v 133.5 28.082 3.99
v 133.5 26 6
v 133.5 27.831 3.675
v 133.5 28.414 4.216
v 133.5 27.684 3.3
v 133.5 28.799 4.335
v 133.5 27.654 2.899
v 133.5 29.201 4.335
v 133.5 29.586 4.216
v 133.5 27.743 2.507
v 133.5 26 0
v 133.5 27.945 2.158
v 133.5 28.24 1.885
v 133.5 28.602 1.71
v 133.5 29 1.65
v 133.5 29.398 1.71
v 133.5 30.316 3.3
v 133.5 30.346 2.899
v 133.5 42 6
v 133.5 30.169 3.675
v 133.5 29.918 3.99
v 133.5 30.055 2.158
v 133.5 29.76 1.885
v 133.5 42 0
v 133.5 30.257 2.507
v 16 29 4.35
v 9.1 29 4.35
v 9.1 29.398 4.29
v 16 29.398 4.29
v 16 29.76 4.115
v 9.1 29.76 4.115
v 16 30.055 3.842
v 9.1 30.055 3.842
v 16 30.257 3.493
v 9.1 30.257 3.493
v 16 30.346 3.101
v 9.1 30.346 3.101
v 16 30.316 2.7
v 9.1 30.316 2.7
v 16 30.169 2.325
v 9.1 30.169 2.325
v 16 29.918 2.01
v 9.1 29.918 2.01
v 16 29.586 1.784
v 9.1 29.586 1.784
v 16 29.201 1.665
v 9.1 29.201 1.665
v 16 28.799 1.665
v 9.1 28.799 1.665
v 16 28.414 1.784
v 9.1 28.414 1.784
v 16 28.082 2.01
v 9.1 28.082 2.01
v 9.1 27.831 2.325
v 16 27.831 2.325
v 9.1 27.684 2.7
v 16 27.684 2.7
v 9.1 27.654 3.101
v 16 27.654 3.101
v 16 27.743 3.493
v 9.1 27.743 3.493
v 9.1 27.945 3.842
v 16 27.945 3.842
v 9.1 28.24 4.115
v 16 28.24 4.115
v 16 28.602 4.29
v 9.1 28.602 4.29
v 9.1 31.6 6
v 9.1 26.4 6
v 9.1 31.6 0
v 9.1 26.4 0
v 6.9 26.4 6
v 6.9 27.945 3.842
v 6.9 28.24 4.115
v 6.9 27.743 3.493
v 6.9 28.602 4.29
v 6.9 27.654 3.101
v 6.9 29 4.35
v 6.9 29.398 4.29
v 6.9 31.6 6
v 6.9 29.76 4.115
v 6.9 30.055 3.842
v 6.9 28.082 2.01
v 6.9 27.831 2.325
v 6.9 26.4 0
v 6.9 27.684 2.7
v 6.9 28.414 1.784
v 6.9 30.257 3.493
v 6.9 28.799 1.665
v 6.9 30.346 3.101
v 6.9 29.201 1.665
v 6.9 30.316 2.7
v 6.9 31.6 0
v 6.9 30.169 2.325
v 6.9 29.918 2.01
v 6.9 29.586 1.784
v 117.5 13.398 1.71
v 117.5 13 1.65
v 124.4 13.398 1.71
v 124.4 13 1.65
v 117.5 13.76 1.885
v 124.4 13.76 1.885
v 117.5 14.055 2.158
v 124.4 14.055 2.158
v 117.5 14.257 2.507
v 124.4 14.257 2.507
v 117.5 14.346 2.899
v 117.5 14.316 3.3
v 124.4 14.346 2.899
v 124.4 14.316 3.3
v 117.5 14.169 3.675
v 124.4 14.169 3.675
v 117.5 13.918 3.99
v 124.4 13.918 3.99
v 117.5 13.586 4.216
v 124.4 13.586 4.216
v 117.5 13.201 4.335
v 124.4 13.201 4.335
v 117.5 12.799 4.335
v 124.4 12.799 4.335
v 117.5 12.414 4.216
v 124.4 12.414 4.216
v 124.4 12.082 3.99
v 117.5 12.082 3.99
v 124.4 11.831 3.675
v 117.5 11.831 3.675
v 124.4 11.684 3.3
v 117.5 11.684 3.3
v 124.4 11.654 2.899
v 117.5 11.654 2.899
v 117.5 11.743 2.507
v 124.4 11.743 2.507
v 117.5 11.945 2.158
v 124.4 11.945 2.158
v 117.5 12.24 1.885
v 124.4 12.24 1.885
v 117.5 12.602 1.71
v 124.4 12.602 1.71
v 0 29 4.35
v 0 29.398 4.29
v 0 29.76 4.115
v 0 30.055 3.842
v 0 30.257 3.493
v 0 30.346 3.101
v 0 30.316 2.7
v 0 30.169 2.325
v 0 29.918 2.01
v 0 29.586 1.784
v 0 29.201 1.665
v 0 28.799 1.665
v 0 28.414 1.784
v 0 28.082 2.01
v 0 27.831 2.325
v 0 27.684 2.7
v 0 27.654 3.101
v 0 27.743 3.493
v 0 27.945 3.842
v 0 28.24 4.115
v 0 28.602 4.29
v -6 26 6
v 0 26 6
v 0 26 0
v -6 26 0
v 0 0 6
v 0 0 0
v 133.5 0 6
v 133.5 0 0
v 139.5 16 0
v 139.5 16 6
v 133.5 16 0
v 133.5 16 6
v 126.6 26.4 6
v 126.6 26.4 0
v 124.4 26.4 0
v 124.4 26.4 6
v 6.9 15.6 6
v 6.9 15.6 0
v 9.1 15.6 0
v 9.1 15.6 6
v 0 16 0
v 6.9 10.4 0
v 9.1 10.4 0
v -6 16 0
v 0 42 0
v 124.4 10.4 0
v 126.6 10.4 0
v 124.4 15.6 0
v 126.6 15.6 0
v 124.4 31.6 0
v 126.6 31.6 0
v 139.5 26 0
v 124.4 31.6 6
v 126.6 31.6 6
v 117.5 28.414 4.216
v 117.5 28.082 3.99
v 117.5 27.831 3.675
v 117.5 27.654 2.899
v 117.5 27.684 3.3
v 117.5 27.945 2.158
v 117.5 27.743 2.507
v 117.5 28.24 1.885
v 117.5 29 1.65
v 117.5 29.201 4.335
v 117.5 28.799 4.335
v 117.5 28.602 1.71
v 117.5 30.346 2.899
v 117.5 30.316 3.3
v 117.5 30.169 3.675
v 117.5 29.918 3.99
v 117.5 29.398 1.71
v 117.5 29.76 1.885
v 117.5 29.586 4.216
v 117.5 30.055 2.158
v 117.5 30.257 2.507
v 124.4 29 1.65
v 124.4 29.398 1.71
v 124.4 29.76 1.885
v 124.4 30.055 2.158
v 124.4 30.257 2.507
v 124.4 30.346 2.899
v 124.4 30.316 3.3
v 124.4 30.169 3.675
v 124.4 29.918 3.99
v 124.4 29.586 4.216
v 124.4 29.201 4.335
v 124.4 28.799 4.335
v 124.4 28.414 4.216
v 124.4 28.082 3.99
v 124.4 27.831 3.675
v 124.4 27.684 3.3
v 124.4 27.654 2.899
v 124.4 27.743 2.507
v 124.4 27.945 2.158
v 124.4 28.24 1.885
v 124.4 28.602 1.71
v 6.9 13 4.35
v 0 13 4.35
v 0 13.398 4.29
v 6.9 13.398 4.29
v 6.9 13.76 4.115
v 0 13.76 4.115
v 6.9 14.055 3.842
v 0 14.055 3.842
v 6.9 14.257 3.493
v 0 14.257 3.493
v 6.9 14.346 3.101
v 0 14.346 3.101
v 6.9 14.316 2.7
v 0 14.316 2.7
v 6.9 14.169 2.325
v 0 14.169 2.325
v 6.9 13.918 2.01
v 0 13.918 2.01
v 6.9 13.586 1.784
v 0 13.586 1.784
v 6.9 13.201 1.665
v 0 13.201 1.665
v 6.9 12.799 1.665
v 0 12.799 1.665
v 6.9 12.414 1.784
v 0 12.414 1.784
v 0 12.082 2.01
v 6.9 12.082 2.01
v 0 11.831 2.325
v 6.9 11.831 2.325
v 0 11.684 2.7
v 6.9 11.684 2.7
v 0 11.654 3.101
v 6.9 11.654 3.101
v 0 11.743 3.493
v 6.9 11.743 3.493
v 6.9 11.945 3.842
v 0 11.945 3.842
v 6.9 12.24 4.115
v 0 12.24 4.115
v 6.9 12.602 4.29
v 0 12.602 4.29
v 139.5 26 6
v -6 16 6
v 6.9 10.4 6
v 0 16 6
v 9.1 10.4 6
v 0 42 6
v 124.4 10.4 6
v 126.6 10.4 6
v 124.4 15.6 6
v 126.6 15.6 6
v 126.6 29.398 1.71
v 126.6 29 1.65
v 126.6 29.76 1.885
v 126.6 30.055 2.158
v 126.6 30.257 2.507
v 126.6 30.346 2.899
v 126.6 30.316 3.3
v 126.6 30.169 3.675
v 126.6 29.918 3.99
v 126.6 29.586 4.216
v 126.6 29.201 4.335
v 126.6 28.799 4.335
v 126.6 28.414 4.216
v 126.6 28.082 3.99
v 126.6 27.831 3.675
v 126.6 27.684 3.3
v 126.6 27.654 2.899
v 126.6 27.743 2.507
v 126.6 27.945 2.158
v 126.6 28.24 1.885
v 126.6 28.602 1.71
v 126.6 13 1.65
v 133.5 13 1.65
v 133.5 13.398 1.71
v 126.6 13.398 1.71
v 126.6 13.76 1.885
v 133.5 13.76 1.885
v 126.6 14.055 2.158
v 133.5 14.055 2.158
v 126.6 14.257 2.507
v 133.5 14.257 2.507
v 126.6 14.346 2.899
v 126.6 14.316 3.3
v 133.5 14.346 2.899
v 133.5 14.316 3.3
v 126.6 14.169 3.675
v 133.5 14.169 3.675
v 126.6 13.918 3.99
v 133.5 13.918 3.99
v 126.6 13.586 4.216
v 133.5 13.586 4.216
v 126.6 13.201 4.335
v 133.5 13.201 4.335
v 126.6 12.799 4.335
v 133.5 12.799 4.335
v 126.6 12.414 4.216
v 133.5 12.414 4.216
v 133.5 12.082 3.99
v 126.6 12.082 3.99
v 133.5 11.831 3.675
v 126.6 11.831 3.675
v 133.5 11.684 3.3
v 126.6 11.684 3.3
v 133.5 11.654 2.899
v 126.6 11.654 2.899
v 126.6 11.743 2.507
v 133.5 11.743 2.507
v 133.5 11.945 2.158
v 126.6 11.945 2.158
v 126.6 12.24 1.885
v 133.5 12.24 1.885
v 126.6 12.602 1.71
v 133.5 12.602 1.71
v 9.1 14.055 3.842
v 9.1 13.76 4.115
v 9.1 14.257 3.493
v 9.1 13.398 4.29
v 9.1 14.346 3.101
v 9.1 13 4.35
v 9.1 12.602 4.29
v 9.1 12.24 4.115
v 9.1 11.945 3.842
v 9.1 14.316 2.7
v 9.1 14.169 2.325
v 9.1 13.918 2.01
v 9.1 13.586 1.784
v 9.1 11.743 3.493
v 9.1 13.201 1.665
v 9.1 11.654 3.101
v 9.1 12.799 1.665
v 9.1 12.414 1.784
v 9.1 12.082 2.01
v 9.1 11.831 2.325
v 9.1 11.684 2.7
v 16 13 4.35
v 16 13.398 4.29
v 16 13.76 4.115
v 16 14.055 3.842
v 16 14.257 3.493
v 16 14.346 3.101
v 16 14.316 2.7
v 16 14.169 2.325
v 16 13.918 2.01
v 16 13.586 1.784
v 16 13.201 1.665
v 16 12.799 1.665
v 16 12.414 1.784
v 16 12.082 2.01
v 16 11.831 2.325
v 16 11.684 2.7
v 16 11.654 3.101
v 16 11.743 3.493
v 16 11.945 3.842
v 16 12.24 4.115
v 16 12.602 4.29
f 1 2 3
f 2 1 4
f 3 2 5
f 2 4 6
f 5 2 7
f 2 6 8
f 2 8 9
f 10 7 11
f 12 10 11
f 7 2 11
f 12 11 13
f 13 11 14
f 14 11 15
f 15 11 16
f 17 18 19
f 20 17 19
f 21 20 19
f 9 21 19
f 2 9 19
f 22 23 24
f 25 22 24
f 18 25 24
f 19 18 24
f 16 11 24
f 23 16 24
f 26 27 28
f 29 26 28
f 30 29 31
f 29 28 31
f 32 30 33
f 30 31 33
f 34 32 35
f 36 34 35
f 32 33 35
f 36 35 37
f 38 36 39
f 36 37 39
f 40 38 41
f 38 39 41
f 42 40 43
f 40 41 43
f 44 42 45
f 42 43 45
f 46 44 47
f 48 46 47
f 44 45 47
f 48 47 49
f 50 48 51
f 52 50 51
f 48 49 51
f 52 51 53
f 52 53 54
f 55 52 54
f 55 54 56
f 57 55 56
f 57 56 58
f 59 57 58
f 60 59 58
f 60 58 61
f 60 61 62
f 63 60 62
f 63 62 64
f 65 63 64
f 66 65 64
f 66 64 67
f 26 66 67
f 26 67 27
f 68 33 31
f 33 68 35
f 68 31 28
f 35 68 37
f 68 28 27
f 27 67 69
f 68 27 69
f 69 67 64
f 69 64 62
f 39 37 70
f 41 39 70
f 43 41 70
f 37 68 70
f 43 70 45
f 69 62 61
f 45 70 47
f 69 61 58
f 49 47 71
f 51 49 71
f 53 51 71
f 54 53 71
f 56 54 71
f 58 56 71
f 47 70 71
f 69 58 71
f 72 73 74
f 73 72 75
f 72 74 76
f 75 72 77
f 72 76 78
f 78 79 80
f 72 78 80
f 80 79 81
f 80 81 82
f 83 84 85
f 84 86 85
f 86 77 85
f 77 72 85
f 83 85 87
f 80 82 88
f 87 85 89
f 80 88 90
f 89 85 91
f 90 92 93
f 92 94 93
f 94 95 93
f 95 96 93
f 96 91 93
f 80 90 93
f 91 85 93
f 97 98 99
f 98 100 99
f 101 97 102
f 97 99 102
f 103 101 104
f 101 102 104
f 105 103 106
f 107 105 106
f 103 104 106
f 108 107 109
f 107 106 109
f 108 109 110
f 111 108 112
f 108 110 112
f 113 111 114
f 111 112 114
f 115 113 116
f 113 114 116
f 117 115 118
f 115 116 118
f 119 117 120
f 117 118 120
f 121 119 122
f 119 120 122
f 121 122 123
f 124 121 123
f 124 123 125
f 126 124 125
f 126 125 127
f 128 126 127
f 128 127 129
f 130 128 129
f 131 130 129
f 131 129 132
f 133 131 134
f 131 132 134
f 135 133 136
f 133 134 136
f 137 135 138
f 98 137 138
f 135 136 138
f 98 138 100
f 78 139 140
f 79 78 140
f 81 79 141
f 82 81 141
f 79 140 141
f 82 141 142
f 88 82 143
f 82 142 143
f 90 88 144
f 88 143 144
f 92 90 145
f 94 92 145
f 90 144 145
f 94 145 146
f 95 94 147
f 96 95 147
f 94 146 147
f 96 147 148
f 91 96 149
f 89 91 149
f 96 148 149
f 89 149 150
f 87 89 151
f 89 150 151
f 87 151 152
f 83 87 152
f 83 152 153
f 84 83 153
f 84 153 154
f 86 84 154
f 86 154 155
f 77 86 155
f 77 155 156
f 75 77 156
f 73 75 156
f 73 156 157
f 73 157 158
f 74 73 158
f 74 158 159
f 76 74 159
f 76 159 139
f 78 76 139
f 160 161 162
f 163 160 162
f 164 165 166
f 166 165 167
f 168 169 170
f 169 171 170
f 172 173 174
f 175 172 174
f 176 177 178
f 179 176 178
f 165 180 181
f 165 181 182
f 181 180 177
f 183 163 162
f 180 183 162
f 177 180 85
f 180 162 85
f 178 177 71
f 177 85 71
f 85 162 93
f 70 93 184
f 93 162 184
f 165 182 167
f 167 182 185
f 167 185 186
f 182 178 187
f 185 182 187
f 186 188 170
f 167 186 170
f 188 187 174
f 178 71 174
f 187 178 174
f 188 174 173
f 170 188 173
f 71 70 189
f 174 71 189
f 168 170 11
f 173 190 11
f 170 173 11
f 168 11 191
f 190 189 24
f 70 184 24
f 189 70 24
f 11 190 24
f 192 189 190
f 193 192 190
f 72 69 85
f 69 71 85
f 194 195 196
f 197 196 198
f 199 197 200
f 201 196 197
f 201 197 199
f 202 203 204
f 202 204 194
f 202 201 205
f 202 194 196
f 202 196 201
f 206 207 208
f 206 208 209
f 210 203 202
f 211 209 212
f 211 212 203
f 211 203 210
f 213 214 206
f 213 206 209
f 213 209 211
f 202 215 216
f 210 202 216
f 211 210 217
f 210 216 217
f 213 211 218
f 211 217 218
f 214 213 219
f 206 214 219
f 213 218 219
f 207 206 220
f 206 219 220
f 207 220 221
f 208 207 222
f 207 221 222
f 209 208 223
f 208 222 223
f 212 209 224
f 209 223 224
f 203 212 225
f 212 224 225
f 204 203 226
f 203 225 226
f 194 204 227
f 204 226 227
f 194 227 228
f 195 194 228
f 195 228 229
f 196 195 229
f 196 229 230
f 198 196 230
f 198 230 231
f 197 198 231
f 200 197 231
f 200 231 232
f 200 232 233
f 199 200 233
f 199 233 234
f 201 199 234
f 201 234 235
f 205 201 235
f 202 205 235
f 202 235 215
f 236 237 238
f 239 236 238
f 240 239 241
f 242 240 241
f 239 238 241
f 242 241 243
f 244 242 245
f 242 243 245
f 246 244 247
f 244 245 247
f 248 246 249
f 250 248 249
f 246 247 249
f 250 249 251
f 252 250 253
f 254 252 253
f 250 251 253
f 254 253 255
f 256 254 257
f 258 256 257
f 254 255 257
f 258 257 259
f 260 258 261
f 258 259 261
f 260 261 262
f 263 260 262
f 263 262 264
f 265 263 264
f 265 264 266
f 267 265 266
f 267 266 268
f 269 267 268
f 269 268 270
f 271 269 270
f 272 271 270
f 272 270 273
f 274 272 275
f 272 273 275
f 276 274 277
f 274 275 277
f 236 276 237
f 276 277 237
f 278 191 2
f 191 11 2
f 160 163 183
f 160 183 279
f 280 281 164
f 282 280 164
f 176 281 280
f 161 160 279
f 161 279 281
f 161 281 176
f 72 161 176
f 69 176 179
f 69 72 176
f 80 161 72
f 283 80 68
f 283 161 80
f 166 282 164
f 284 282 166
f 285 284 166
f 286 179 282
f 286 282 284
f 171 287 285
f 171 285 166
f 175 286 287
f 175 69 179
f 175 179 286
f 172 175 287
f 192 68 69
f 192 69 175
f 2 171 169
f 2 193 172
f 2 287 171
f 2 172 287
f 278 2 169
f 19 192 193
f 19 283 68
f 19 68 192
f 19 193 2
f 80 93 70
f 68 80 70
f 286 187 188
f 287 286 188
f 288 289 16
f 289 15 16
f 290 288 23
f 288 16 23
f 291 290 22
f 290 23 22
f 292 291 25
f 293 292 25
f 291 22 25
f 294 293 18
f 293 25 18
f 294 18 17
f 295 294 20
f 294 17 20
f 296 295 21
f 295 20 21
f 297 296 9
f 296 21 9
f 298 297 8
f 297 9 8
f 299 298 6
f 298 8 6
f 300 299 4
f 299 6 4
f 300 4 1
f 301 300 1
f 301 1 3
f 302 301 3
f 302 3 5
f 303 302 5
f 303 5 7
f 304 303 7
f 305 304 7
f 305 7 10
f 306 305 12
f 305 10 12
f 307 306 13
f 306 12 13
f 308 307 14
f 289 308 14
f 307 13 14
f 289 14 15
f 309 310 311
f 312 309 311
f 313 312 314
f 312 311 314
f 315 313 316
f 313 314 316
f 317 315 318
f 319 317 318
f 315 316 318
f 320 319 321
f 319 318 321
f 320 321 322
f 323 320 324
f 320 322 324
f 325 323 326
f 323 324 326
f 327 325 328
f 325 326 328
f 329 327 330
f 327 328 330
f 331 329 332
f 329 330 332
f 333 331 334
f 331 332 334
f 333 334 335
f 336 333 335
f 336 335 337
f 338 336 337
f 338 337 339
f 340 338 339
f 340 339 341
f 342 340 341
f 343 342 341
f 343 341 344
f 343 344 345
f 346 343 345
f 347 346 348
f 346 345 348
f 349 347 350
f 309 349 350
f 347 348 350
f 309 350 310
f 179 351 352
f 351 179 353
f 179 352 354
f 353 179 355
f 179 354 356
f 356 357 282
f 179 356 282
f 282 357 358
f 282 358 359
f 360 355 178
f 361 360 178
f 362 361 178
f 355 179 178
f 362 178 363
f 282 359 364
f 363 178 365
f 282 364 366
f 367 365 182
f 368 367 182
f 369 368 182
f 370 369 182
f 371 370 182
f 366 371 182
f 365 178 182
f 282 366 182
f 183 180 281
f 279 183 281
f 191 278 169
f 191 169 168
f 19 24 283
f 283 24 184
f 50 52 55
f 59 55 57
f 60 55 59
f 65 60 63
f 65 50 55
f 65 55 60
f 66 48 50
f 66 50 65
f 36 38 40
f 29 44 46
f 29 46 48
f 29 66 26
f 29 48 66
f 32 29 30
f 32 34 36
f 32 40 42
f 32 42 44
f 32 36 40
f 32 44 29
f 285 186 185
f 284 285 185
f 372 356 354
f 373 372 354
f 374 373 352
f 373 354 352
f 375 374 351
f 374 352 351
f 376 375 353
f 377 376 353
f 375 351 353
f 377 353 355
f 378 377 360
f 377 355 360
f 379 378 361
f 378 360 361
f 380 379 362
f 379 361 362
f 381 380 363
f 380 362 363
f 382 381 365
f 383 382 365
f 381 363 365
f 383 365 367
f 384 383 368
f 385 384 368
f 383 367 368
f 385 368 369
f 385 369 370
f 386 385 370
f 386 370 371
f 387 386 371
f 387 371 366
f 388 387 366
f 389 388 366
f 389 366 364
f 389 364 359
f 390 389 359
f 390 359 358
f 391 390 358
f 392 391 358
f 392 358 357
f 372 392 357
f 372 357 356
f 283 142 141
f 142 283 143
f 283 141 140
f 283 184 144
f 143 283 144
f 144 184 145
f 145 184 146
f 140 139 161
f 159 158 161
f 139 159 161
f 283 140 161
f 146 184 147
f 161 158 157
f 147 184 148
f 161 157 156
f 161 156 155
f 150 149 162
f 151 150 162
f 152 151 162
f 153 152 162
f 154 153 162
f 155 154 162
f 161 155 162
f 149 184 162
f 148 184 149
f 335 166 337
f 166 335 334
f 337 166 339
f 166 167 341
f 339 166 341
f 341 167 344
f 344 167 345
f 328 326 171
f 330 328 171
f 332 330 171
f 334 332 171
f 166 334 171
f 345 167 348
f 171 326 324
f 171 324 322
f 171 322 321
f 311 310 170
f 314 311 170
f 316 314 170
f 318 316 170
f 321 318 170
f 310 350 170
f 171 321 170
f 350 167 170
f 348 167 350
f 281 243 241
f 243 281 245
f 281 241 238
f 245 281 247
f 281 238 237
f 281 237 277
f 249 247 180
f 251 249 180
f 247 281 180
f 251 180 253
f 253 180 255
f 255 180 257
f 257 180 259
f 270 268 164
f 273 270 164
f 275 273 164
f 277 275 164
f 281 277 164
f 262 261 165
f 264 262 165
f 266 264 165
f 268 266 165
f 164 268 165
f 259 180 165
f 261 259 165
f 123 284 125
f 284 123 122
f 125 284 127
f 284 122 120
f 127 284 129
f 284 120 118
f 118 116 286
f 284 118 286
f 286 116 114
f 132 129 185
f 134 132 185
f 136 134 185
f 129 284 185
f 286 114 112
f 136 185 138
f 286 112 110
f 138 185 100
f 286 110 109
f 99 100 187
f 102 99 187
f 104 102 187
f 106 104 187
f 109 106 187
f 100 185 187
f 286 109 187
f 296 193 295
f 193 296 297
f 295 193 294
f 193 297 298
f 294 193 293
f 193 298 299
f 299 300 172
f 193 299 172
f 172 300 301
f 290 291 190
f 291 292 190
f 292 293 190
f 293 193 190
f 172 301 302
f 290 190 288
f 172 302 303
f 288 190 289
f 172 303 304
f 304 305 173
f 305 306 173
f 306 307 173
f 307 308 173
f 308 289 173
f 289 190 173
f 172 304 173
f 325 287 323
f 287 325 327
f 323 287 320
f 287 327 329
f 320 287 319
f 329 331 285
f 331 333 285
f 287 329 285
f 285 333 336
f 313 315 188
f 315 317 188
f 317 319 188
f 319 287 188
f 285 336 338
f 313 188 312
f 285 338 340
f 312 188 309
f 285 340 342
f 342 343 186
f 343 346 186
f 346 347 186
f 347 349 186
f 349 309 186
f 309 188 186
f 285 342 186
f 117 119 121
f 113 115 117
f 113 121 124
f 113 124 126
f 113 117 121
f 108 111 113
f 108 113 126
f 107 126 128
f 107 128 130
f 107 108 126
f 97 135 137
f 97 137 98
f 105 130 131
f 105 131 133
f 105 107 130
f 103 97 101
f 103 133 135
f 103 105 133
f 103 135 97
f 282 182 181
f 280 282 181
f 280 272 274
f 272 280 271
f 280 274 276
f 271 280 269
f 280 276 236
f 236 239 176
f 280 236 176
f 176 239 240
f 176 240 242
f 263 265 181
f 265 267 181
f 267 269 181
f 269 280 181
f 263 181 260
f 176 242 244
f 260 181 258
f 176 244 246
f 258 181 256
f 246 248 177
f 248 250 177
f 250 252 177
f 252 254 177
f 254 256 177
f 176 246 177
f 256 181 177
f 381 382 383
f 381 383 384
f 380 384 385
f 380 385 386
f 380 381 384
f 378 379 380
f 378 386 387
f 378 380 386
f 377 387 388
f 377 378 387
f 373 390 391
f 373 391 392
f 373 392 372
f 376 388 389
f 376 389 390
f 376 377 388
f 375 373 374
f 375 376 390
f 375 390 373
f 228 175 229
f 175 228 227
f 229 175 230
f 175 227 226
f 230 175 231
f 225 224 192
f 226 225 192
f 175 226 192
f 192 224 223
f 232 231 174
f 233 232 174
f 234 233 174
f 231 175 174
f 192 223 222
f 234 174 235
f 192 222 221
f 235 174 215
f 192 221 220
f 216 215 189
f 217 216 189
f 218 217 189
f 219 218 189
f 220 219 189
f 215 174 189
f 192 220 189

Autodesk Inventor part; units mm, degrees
ref_plane "YZ Plane" through (0, 0, 0) normal (1, 0, 0) x (0, 1, 0)
ref_plane "XZ Plane" through (0, 0, 0) normal (0, 1, 0) x (-1, 0, 0)
ref_plane "XY Plane" through (0, 0, 0) normal (0, 0, 1) x (1, 0, 0)
sketch "스케치1" plane through (0, 0, 0) normal (0, 0, 1) x (1, 0, 0)
  line L0 (0, 0) -> (133.5, 0)
  line L1 (133.5, 0) -> (133.5, 42)
  line L2 (133.5, 42) -> (0, 42)
  line L3 (0, 42) -> (0, 0)
  dimension "d0" = 133.5
  dimension "d1" = 42
extrude "돌출1" add sketch "스케치1" along normal blind 6
sketch "스케치2" plane through (133.5, 0, 0) normal (1, 0, 0) x (0, 0, -1)
  line L0 (0, 0) -> (0, 42) projected
  line L1 (0, 42) -> (-6, 42) projected
  line L2 (-6, 0) -> (-6, 42) projected
  line L3 (0, 0) -> (-6, 0) projected
  line L4 (-6, 16) -> (0, 16)
  line L5 (0, 16) -> (0, 26)
  line L6 (0, 26) -> (-6, 26)
  line L7 (-6, 26) -> (-6, 16)
  line L8 (-6, 16) -> (0, 26) construction
  line L9 (0, 16) -> (-6, 26) construction
  point P0 (-3, 21)
  dimension "d4" = 10
extrude "돌출2" add sketch "스케치2" along normal blind 6 contours L4 L2 L6 L0
sketch "스케치3" plane through (0, 0, 0) normal (-1, 0, 0) x (0, 0, 1)
  line L0 (6, 26) -> (0, 26) projected
  line L1 (0, 16) -> (6, 16) projected
  line L2 (0, 42) -> (0, 0) projected
  line L3 (0, 0) -> (6, 0) projected
  line L4 (6, 42) -> (6, 0) projected
  line L5 (0, 42) -> (6, 42) projected
extrude "돌출3" add sketch "스케치3" along normal blind 6 contours L4 L1 L2 L0
sketch "스케치4" plane through (0, 42, 0) normal (-1, 0, 0) x (0, 0, 1)
  line L0 (0, -16) -> (6, -16) projected
  line L1 (6, 0) -> (6, -16) projected
  line L2 (0, 0) -> (6, 0) projected
  line L3 (0, 0) -> (0, -16) projected
  line L4 (6, -26) -> (0, -26) projected
  line L5 (0, -26) -> (0, -42) projected
  line L6 (0, -42) -> (6, -42) projected
  line L7 (6, -26) -> (6, -42) projected
  line L8 (0, -16) -> (6, -16)
  line L9 (6, -16) -> (6, -10)
  line L10 (6, -10) -> (0, -10)
  line L11 (0, -10) -> (0, -16)
  line L12 (6, -26) -> (0, -26)
  line L13 (0, -26) -> (0, -32)
  line L14 (0, -32) -> (6, -32)
  line L15 (6, -32) -> (6, -26)
  circle A0 centre (3, -13) radius 1.35
  circle A1 centre (3, -29) radius 1.35
  dimension "d9" = 6
  dimension "d10" = 6
  dimension "d11" = 6
  dimension "d12" = 6
  dimension "d13" = 2.7
  dimension "d14" = 2.7
extrude "돌출4" cut sketch "스케치4" against normal blind 16 contours A0 | A1
sketch "스케치5" plane through (133.5, 42, 6) normal (1, 0, 0) x (0, 0, -1)
  circle A0 centre (3, -13) radius 1.35 projected
  circle A1 centre (3, -29) radius 1.35 projected
  point P0 (6, -42)
extrude "돌출5" cut sketch "스케치5" against normal blind 16
sketch "스케치7" plane through (0, 0, 0) normal (0, 0, -1) x (-1, 0, 0)
  line L0 (-133.5, 0) -> (-133.5, 16) projected
  line L1 (-133.5, 11.65) -> (-133.5, 14.35) projected
  line L2 (-133.5, 0) -> (-133.5, 16) projected
  line L3 (-133.5, 11.65) -> (-133.5, 14.35) projected
  line L4 (-133.5, 0) -> (-133.5, 16) projected
  line L5 (-133.5, 0) -> (-133.5, 16) projected
  line L6 (-133.5, 42) -> (0, 42) projected
  line L7 (-133.5, 42) -> (0, 42) projected
  line L8 (0, 0) -> (-133.5, 0) projected
  line L9 (0, 0) -> (-133.5, 0) projected
  line L10 (-133.5, 16) -> (-139.5, 16) projected
  line L11 (-133.5, 16) -> (-139.5, 16) projected
  line L12 (-133.5, 16) -> (-139.5, 16) projected
  line L13 (-133.5, 16) -> (-139.5, 16) projected
  line L14 (-117.5, 11.65) -> (-117.5, 14.35) projected
  line L15 (-117.5, 11.65) -> (-117.5, 14.35) projected
  line L16 (-133.5, 11.65) -> (-133.5, 14.35) projected
  line L17 (-117.5, 11.65) -> (-117.5, 14.35) projected
  line L18 (-133.5, 26) -> (-139.5, 26) projected
  line L19 (-133.5, 26) -> (-139.5, 26) projected
  line L20 (-133.5, 26) -> (-139.5, 26) projected
  line L21 (-133.5, 26) -> (-139.5, 26) projected
  line L22 (-139.5, 26) -> (-139.5, 16) projected
  line L23 (-139.5, 16) -> (-139.5, 26) projected
  line L24 (-117.5, 27.65) -> (-117.5, 30.35) projected
  line L25 (-133.5, 27.65) -> (-133.5, 30.35) projected
  line L26 (-133.5, 26) -> (-133.5, 42) projected
  line L27 (-133.5, 26) -> (-133.5, 42) projected
  line L28 (-133.5, 27.65) -> (-133.5, 30.35) projected
  line L29 (-133.5, 26) -> (-133.5, 42) projected
  line L30 (-133.5, 26) -> (-133.5, 42) projected
  line L31 (0, 16) -> (0, 0) projected
  line L32 (0, 16) -> (0, 0) projected
  line L33 (0, 0) -> (-133.5, 0) projected
  line L34 (0, 0) -> (-133.5, 0) projected
  line L35 (-133.5, 0) -> (-133.5, 16) projected
  line L36 (-133.5, 16) -> (-139.5, 16) projected
  line L37 (-139.5, 26) -> (-139.5, 16) projected
  line L38 (-133.5, 26) -> (-139.5, 26) projected
  line L39 (-133.5, 26) -> (-133.5, 42) projected
  line L40 (-133.5, 42) -> (0, 42) projected
  line L41 (0, 42) -> (0, 26) projected
  line L42 (0, 26) -> (6, 26) projected
  line L43 (6, 16) -> (6, 26) projected
  line L44 (0, 16) -> (6, 16) projected
  line L45 (0, 16) -> (0, 0) projected
  line L46 (0, 0) -> (-133.5, 0) projected
  line L47 (-133.5, 0) -> (-133.5, 16) projected
  line L48 (0, 0) -> (-133.5, 0) projected
  line L49 (0, 16) -> (0, 0) projected
  line L50 (0, 16) -> (6, 16) projected
  line L51 (6, 26) -> (6, 16) projected
  line L52 (0, 26) -> (6, 26) projected
  line L53 (0, 42) -> (0, 26) projected
  line L54 (-133.5, 42) -> (0, 42) projected
  line L55 (-133.5, 26) -> (-133.5, 42) projected
  line L56 (-133.5, 26) -> (-139.5, 26) projected
  line L57 (-139.5, 16) -> (-139.5, 26) projected
  line L58 (-133.5, 16) -> (-139.5, 16) projected
  line L59 (0, 42) -> (0, 26) projected
  line L60 (0, 42) -> (0, 26) projected
  line L61 (-133.5, 42) -> (0, 42) projected
  line L62 (-133.5, 42) -> (0, 42) projected
  line L63 (-133.5, 27.65) -> (-133.5, 30.35) projected
  line L64 (-139.5, 26) -> (-139.5, 16) projected
  line L65 (-139.5, 16) -> (-139.5, 26) projected
  line L66 (-16, 14.35) -> (-16, 11.65) projected
  line L67 (-16, 14.35) -> (-16, 11.65) projected
  line L68 (0, 14.35) -> (0, 11.65) projected
  line L69 (0, 16) -> (0, 0) projected
  line L70 (0, 16) -> (0, 0) projected
  line L71 (-16, 30.35) -> (-16, 27.65) projected
  line L72 (0, 30.35) -> (0, 27.65) projected
  line L73 (-16, 14.35) -> (-16, 11.65) projected
  line L74 (0, 14.35) -> (0, 11.65) projected
  line L75 (0, 14.35) -> (0, 11.65) projected
  line L76 (0, 30.35) -> (0, 27.65) projected
  line L77 (0, 30.35) -> (0, 27.65) projected
  line L78 (0, 42) -> (0, 26) projected
  line L79 (0, 42) -> (0, 26) projected
  line L80 (6, 16) -> (6, 26) projected
  line L81 (0, 16) -> (6, 16) projected
  line L82 (6, 26) -> (6, 16) projected
  line L83 (6, 16) -> (6, 26) projected
  line L84 (0, 16) -> (6, 16) projected
  line L85 (0, 16) -> (6, 16) projected
  line L86 (0, 16) -> (6, 16) projected
  line L87 (0, 26) -> (6, 26) projected
  line L88 (0, 26) -> (6, 26) projected
  line L89 (0, 26) -> (6, 26) projected
  line L90 (6, 26) -> (6, 16) projected
  line L91 (-16, 30.35) -> (-16, 27.65) projected
  line L92 (-16, 30.35) -> (-16, 27.65) projected
  line L93 (0, 26) -> (6, 26) projected
  line L94 (-117.5, 27.65) -> (-117.5, 30.35) projected
  line L95 (-117.5, 27.65) -> (-117.5, 30.35) projected
  line L96 (-133.5, 30.35) -> (-117.5, 30.35) projected
  line L97 (-133.5, 27.65) -> (-117.5, 27.65) projected
  line L98 (-133.5, 14.35) -> (-117.5, 14.35) projected
  line L99 (-133.5, 11.65) -> (-117.5, 11.65) projected
  line L100 (0, 30.35) -> (-16, 30.35) projected
  line L101 (0, 27.65) -> (-16, 27.65) projected
  line L102 (0, 14.35) -> (-16, 14.35) projected
  line L103 (0, 11.65) -> (-16, 11.65) projected
  line L104 (-126.6, 26.4) -> (-124.4, 26.4)
  line L105 (-124.4, 26.4) -> (-124.4, 31.6)
  line L106 (-124.4, 31.6) -> (-126.6, 31.6)
  line L107 (-126.6, 31.6) -> (-126.6, 26.4)
  line L108 (-126.6, 26.4) -> (-124.4, 31.6) construction
  line L109 (-124.4, 26.4) -> (-126.6, 31.6) construction
  line L110 (-126.6, 10.4) -> (-124.4, 10.4)
  line L111 (-124.4, 10.4) -> (-124.4, 15.6)
  line L112 (-124.4, 15.6) -> (-126.6, 15.6)
  line L113 (-126.6, 15.6) -> (-126.6, 10.4)
  line L114 (-126.6, 10.4) -> (-124.4, 15.6) construction
  line L115 (-124.4, 10.4) -> (-126.6, 15.6) construction
  line L116 (-9.1, 26.4) -> (-6.9, 26.4)
  line L117 (-6.9, 26.4) -> (-6.9, 31.6)
  line L118 (-6.9, 31.6) -> (-9.1, 31.6)
  line L119 (-9.1, 31.6) -> (-9.1, 26.4)
  line L120 (-9.1, 26.4) -> (-6.9, 31.6) construction
  line L121 (-6.9, 26.4) -> (-9.1, 31.6) construction
  line L122 (-9.1, 10.4) -> (-6.9, 10.4)
  line L123 (-6.9, 10.4) -> (-6.9, 15.6)
  line L124 (-6.9, 15.6) -> (-9.1, 15.6)
  line L125 (-9.1, 15.6) -> (-9.1, 10.4)
  line L126 (-9.1, 10.4) -> (-6.9, 15.6) construction
  line L127 (-6.9, 10.4) -> (-9.1, 15.6) construction
  point P0 (-125.5, 29)
  point P1 (-125.5, 13)
  point P2 (-8, 29)
  point P3 (-8, 13)
  dimension "d27" = 2.2
  dimension "d28" = 5.2
  dimension "d29" = 5.2
  dimension "d30" = 2.2
  dimension "d31" = 5.2
  dimension "d32" = 5.2
extrude "돌출7" cut sketch "스케치7" against normal blind 16 contours L113 L98 L111 L99 | L99 L111 L110 L113 | L113 L112 L111 L98 | L123 L122 L125 L103 | L103 L125 L102 L123 | L102 L125 L124 L123 | L107 L96 L105 L97 | L97 L105 L104 L107 | L107 L106 L105 L96 | L117 L116 L119 L101 | L101 L119 L100 L117 | L100 L119 L118 L117
sketch "스케치8" plane through (0, 0, 6) normal (0, 0, 1) x (1, 0, 0)
  line L0 (9.1, 26.4) -> (6.9, 26.4) projected
  line L1 (6.9, 26.4) -> (6.9, 31.6) projected
  line L2 (6.9, 31.6) -> (9.1, 31.6) projected
  line L3 (9.1, 31.6) -> (9.1, 26.4) projected
  line L4 (126.6, 10.4) -> (124.4, 10.4) projected
  line L5 (124.4, 10.4) -> (124.4, 15.6) projected
  line L6 (124.4, 15.6) -> (126.6, 15.6) projected
  line L7 (126.6, 15.6) -> (126.6, 10.4) projected
  line L8 (9.1, 10.4) -> (6.9, 10.4) projected
  line L9 (6.9, 10.4) -> (6.9, 15.6) projected
  line L10 (6.9, 15.6) -> (9.1, 15.6) projected
  line L11 (9.1, 15.6) -> (9.1, 10.4) projected
  line L12 (126.6, 26.4) -> (124.4, 26.4) projected
  line L13 (124.4, 26.4) -> (124.4, 31.6) projected
  line L14 (124.4, 31.6) -> (126.6, 31.6) projected
  line L15 (126.6, 31.6) -> (126.6, 26.4) projected
  line L16 (133.5, 0) -> (133.5, 16) projected
  line L17 (133.5, 16) -> (139.5, 16) projected
  line L18 (139.5, 26) -> (139.5, 16) projected
  line L19 (133.5, 26) -> (139.5, 26) projected
  line L20 (133.5, 26) -> (133.5, 42) projected
  line L21 (133.5, 42) -> (0, 42) projected
  line L22 (0, 42) -> (0, 26) projected
  line L23 (0, 26) -> (-6, 26) projected
  line L24 (-6, 16) -> (-6, 26) projected
  line L25 (0, 16) -> (-6, 16) projected
  line L26 (0, 16) -> (0, 0) projected
  line L27 (0, 0) -> (133.5, 0) projected
  line L28 (133.5, 0) -> (0, 0)
  line L29 (0, 0) -> (0, 42)
  line L30 (0, 42) -> (133.5, 42)
  line L31 (133.5, 42) -> (133.5, 0)
extrude "돌출8" cut sketch "스케치8" against normal through all contours L31 L19 L18 L17 | L25 L24 L23 L29
sketch "스케치9" plane through (133.5, 0, 0) normal (1, 0, 0) x (0, 0, -1)
  circle A0 centre (-3, 29) radius 1.35 projected
  circle A1 centre (-3, 13) radius 1.35 projected
  line L0 (-6, 0) -> (-6, 42) projected
  line L1 (0, 0) -> (-6, 0) projected
  line L2 (0, 0) -> (0, 42) projected
  line L3 (0, 42) -> (-6, 42) projected
  line L4 (-6, 16) -> (0, 16)
  line L5 (0, 16) -> (0, 26)
  line L6 (0, 26) -> (-6, 26)
  line L7 (-6, 26) -> (-6, 16)
  line L8 (-6, 16) -> (0, 26) construction
  line L9 (0, 16) -> (-6, 26) construction
  point P0 (-3, 21)
  dimension "d37" = 10
extrude "돌출9" add sketch "스케치9" along normal blind 6 contours L0 L6 L2 L4
sketch "스케치10" plane through (0, 0, 0) normal (-1, 0, 0) x (0, 0, 1)
  line L0 (6, 15.6) -> (6, 10.4) projected
  line L1 (6, 10.4) -> (6, 15.6) projected
  line L2 (0, 15.6) -> (0, 10.4) projected
  line L3 (6, 31.6) -> (6, 26.4) projected
  line L4 (0, 26.4) -> (0, 31.6) projected
  line L5 (0, 10.4) -> (0, 15.6) projected
  line L6 (6, 0) -> (6, 16) projected
  line L7 (0, 0) -> (0, 16) projected
  line L8 (0, 0) -> (6, 0) projected
  line L9 (0, 16) -> (6, 16) projected
  line L10 (6, 0) -> (6, 16) projected
  line L11 (0, 0) -> (6, 0) projected
  line L12 (0, 0) -> (0, 16) projected
  circle A0 centre (3, 13) radius 1.35 projected
  line L13 (6, 26) -> (6, 42) projected
  line L14 (0, 42) -> (6, 42) projected
  line L15 (6, 26) -> (0, 26) projected
  line L16 (0, 26) -> (0, 42) projected
  line L17 (0, 42) -> (6, 42) projected
  line L18 (6, 26) -> (6, 42) projected
  circle A1 centre (3, 29) radius 1.35 projected
  line L19 (0, 26) -> (0, 42) projected
  line L20 (0, 31.6) -> (0, 26.4) projected
  line L21 (6, 26.4) -> (6, 31.6) projected
  line L22 (6, 31.6) -> (6, 26.4) projected
  line L23 (6, 26.4) -> (6, 31.6) projected
  circle A2 centre (3, 29) radius 1.35 projected
  circle A3 centre (3, 29) radius 1.35 projected
  circle A4 centre (3, 13) radius 1.35 projected
  circle A5 centre (3, 13) radius 1.35 projected
  circle A6 centre (3, 29) radius 1.35 projected
  line L24 (0, 31.6) -> (6, 31.6) projected
  line L25 (0, 26.4) -> (6, 26.4) projected
  line L26 (6, 31.6) -> (6, 26.4) projected
  line L27 (0, 31.6) -> (6, 31.6) projected
  line L28 (0, 26.4) -> (0, 31.6) projected
  line L29 (0, 26.4) -> (6, 26.4) projected
  circle A7 centre (3, 29) radius 1.35 projected
  circle A8 centre (3, 29) radius 1.35 projected
  circle A9 centre (3, 29) radius 1.35 projected
  circle A10 centre (3, 13) radius 1.35 projected
  circle A11 centre (3, 13) radius 1.35 projected
  line L30 (0, 31.6) -> (6, 31.6) projected
  line L31 (0, 31.6) -> (6, 31.6) projected
  line L32 (0, 31.6) -> (6, 31.6) projected
  circle A12 centre (3, 29) radius 1.35 projected
  line L33 (0, 26.4) -> (6, 26.4) projected
  line L34 (6, 26.4) -> (6, 31.6) projected
  line L35 (0, 26.4) -> (6, 26.4) projected
  line L36 (0, 31.6) -> (0, 26.4) projected
  line L37 (0, 31.6) -> (6, 31.6) projected
  circle A13 centre (3, 29) radius 1.35 projected
  line L38 (0, 26.4) -> (6, 26.4) projected
  line L39 (0, 26.4) -> (6, 26.4) projected
  line L40 (0, 31.6) -> (0, 26.4) projected
  line L41 (0, 26.4) -> (0, 31.6) projected
  line L42 (6, 15.6) -> (6, 10.4) projected
  line L43 (0, 42) -> (6, 42) projected
  line L44 (0, 42) -> (6, 42) projected
  line L45 (6, 0) -> (6, 16) projected
  line L46 (6, 26) -> (6, 16) projected
  line L47 (6, 26) -> (6, 42) projected
  line L48 (6, 42) -> (6, 0) projected
  line L49 (6, 26.4) -> (6, 31.6) projected
  line L50 (6, 31.6) -> (6, 26.4) projected
  line L51 (6, 10.4) -> (6, 15.6) projected
  line L52 (6, 15.6) -> (6, 10.4) projected
  line L53 (6, 10.4) -> (6, 15.6) projected
  line L54 (6, 15.6) -> (6, 10.4) projected
  line L55 (6, 26.4) -> (6, 31.6) projected
  line L56 (6, 31.6) -> (6, 26.4) projected
  line L57 (0, 0) -> (0, 16) projected
  line L58 (0, 42) -> (0, 0) projected
  line L59 (0, 26) -> (0, 42) projected
  line L60 (0, 16) -> (0, 26) projected
  line L61 (0, 26.4) -> (0, 31.6) projected
  line L62 (0, 31.6) -> (0, 26.4) projected
  line L63 (0, 10.4) -> (0, 15.6) projected
  line L64 (0, 15.6) -> (0, 10.4) projected
  line L65 (0, 10.4) -> (0, 15.6) projected
  line L66 (0, 15.6) -> (0, 10.4) projected
  line L67 (0, 26.4) -> (0, 31.6) projected
  line L68 (0, 31.6) -> (0, 26.4) projected
  line L69 (0, 0) -> (6, 0) projected
  line L70 (0, 0) -> (6, 0) projected
  line L71 (0, 10.4) -> (0, 15.6) projected
  line L72 (0, 15.6) -> (0, 10.4) projected
  line L73 (6, 10.4) -> (6, 15.6) projected
  line L74 (6, 42) -> (6, 0) projected
  circle A14 centre (3, 29) radius 1.35 projected
  circle A15 centre (3, 13) radius 1.35 projected
  line L75 (0, 16) -> (0, 26) projected
  line L76 (6, 26) -> (6, 16) projected
  line L77 (6, 16) -> (0, 16) projected
  line L78 (0, 16) -> (6, 16) projected
  line L79 (0, 26) -> (6, 26) projected
  line L80 (6, 26) -> (0, 26) projected
  line L81 (6, 26) -> (6, 16) projected
  line L82 (6, 16) -> (0, 16) projected
  line L83 (0, 16) -> (0, 26) projected
  line L84 (0, 26) -> (6, 26) projected
  line L85 (0, 16) -> (6, 16) projected
  line L86 (6, 16) -> (0, 16) projected
  line L87 (6, 26) -> (0, 26) projected
  line L88 (0, 26) -> (6, 26) projected
  circle A16 centre (3, 29) radius 1.35 projected
  line L89 (0, 31.6) -> (6, 31.6) projected
  line L90 (0, 31.6) -> (6, 31.6) projected
  circle A17 centre (3, 29) radius 1.35 projected
  line L91 (0, 26.4) -> (6, 26.4) projected
  line L92 (0, 15.6) -> (6, 15.6) projected
  line L93 (0, 26.4) -> (6, 26.4) projected
  circle A18 centre (3, 13) radius 1.35 projected
  circle A19 centre (3, 13) radius 1.35 projected
  line L94 (0, 15.6) -> (6, 15.6) projected
  line L95 (0, 10.4) -> (6, 10.4) projected
  line L96 (0, 10.4) -> (6, 10.4) projected
  circle A20 centre (3, 13) radius 1.35 projected
  line L97 (0, 15.6) -> (6, 15.6) projected
  line L98 (0, 15.6) -> (6, 15.6) projected
  circle A21 centre (3, 13) radius 1.35 projected
  line L99 (0, 10.4) -> (6, 10.4) projected
  line L100 (0, 10.4) -> (6, 10.4) projected
  line L101 (6, 10.4) -> (6, 15.6) projected
  line L102 (0, 10.4) -> (6, 10.4) projected
  line L103 (0, 15.6) -> (0, 10.4) projected
  line L104 (0, 15.6) -> (6, 15.6) projected
  circle A22 centre (3, 13) radius 1.35 projected
  line L105 (0, 15.6) -> (6, 15.6) projected
  line L106 (0, 15.6) -> (6, 15.6) projected
  line L107 (6, 15.6) -> (6, 10.4) projected
  line L108 (0, 15.6) -> (6, 15.6) projected
  line L109 (0, 10.4) -> (0, 15.6) projected
  line L110 (0, 10.4) -> (6, 10.4) projected
  circle A23 centre (3, 13) radius 1.35 projected
  line L111 (0, 0) -> (6, 0) projected
  line L112 (0, 42) -> (0, 0) projected
  circle A24 centre (3, 13) radius 1.35 projected
  circle A25 centre (3, 29) radius 1.35 projected
  line L113 (6, 42) -> (6, 0) projected
  line L114 (0, 42) -> (6, 42) projected
  line L115 (0, 42) -> (0, 0) projected
  line L116 (0, 0) -> (6, 0) projected
  circle A26 centre (3, 13) radius 1.35 projected
  circle A27 centre (3, 29) radius 1.35 projected
  circle A28 centre (3, 13) radius 1.35 projected
  circle A29 centre (3, 13) radius 1.35 projected
  circle A30 centre (3, 13) radius 1.35 projected
  line L117 (0, 42) -> (6, 42) projected
  circle A31 centre (3, 29) radius 1.35 projected
  circle A32 centre (3, 29) radius 1.35 projected
  circle A33 centre (3, 29) radius 1.35 projected
  circle A34 centre (3, 13) radius 1.35 projected
  circle A35 centre (3, 29) radius 1.35 projected
  circle A36 centre (3, 13) radius 1.35 projected
  circle A37 centre (3, 13) radius 1.35 projected
  circle A38 centre (3, 29) radius 1.35 projected
  circle A39 centre (3, 29) radius 1.35 projected
  line L118 (6, 10.4) -> (6, 15.6) projected
  line L119 (0, 10.4) -> (6, 10.4) projected
  line L120 (0, 15.6) -> (0, 10.4) projected
  line L121 (0, 15.6) -> (6, 15.6) projected
  circle A40 centre (3, 13) radius 1.35 projected
  line L122 (6, 26.4) -> (6, 31.6) projected
  line L123 (0, 26.4) -> (6, 26.4) projected
  line L124 (0, 31.6) -> (0, 26.4) projected
  line L125 (0, 31.6) -> (6, 31.6) projected
  circle A41 centre (3, 29) radius 1.35 projected
  line L126 (0, 10.4) -> (6, 10.4) projected
  line L127 (0, 10.4) -> (6, 10.4) projected
  line L128 (0, 15.6) -> (6, 15.6) projected
  line L129 (0, 15.6) -> (6, 15.6) projected
  line L130 (0, 26.4) -> (6, 26.4) projected
  line L131 (0, 26.4) -> (6, 26.4) projected
  line L132 (0, 31.6) -> (6, 31.6) projected
  line L133 (0, 31.6) -> (6, 31.6) projected
  line L134 (6, 15.6) -> (6, 10.4) projected
  line L135 (0, 15.6) -> (6, 15.6) projected
  line L136 (0, 10.4) -> (0, 15.6) projected
  line L137 (0, 10.4) -> (6, 10.4) projected
  circle A42 centre (3, 13) radius 1.35 projected
  circle A43 centre (3, 29) radius 1.35 projected
  circle A44 centre (3, 29) radius 1.35 projected
  circle A45 centre (3, 13) radius 1.35 projected
  circle A46 centre (3, 13) radius 1.35 projected
  line L138 (6, 31.6) -> (6, 26.4) projected
  line L139 (0, 31.6) -> (6, 31.6) projected
  line L140 (0, 26.4) -> (0, 31.6) projected
  line L141 (0, 26.4) -> (6, 26.4) projected
  circle A47 centre (3, 29) radius 1.35 projected
  line L142 (0, 10.4) -> (6, 10.4) projected
  line L143 (0, 10.4) -> (6, 10.4) projected
extrude "돌출10" add sketch "스케치10" along normal blind 6 contours L9 L58 L15 L46
properties part number "frame_upper3"
